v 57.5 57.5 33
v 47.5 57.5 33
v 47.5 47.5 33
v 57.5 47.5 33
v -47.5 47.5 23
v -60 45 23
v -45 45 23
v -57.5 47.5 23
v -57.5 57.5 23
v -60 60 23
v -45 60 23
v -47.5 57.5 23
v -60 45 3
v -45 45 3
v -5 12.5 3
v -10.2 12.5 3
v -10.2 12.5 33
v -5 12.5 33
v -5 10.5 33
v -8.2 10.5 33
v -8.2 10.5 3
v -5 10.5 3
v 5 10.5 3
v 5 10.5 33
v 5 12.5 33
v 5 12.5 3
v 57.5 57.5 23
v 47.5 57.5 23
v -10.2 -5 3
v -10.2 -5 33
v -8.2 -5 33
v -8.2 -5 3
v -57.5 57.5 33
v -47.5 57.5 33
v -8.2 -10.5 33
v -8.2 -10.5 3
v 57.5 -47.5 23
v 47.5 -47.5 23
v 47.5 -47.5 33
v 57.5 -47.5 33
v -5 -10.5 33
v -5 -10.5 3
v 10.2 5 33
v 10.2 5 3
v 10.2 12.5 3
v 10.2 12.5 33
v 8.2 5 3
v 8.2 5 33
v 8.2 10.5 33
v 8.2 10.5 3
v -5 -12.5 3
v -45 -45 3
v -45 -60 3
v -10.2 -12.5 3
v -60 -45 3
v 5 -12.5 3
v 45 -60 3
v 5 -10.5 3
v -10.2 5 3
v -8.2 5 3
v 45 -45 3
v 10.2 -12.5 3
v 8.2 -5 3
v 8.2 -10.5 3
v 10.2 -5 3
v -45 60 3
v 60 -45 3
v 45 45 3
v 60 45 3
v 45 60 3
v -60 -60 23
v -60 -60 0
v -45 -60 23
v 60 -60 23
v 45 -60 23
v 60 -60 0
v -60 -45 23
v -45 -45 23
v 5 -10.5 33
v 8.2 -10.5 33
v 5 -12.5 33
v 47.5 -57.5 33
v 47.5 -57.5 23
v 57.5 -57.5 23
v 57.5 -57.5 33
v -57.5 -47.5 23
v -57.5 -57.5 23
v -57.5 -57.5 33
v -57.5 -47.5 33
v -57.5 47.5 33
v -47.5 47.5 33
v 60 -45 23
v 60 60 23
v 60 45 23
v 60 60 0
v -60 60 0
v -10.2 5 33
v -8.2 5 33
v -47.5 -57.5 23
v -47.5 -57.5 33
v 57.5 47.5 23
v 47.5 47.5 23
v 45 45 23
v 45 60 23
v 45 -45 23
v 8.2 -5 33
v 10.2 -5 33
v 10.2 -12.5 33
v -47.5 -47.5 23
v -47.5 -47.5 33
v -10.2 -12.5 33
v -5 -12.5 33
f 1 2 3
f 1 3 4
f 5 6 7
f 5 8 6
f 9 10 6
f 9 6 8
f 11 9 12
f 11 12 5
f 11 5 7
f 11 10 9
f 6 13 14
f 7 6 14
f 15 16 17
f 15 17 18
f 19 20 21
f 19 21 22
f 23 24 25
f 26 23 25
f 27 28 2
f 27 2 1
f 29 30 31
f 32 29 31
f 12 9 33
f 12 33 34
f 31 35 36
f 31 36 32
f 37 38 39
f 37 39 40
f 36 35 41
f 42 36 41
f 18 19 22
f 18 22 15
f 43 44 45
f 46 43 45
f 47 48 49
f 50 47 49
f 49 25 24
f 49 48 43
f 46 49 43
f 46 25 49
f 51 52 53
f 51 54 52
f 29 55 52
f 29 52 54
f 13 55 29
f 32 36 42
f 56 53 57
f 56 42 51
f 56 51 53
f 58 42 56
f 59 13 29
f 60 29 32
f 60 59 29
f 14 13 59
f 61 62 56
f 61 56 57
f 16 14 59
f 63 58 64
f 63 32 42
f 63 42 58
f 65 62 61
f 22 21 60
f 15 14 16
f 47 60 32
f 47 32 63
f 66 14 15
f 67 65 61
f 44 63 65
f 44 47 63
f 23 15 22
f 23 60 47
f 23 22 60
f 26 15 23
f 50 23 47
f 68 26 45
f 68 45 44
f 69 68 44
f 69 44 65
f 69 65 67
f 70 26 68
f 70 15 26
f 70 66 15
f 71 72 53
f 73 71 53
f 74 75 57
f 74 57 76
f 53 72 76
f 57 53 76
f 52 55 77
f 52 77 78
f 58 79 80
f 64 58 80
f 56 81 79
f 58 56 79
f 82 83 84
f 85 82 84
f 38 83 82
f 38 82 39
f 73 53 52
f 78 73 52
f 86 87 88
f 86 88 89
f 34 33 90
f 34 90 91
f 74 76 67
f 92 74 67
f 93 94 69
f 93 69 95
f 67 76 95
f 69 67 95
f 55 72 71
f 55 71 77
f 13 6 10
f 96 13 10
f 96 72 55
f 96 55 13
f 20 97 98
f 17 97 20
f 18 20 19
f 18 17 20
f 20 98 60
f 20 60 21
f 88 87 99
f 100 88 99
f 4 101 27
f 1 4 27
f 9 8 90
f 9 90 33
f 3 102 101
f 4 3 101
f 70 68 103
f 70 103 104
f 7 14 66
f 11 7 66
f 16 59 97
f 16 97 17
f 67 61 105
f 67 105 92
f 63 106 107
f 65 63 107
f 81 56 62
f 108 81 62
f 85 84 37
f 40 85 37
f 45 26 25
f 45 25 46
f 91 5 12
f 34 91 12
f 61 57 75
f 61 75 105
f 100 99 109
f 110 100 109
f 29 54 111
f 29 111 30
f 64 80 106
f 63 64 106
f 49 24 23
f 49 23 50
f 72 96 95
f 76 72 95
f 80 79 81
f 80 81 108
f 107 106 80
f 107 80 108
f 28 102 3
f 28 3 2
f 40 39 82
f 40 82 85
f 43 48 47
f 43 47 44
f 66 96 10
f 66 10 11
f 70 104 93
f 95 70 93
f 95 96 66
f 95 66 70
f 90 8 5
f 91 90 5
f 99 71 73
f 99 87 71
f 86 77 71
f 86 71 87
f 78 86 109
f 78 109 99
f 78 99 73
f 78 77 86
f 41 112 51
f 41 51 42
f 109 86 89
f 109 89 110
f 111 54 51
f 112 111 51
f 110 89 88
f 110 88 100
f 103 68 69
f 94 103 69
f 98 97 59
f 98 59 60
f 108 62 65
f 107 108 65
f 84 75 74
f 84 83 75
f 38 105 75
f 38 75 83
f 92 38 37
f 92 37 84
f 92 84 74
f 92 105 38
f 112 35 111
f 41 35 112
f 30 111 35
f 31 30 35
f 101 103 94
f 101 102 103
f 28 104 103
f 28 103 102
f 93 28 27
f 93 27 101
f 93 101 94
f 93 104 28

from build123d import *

# Parameters (mm, degrees)
F0_W      = 120
F0_H      = 120
F1_DEPTH  = 3
F2_W      = 15
F2_H      = 15
F3_DEPTH  = 20
F4_W      = 10
F4_H      = 10
F5_DEPTH  = 10
F6_W      = 20.4
F6_H      = 25
F7_DEPTH  = 33
F8_W      = 16.4
F8_H      = 21
F9_DEPTH  = 30
F10_W     = 20.4
F10_H     = 10
F11_DEPTH = 30
F12_W     = 10
F12_H     = 25
F13_DEPTH = 30


with BuildPart() as f1:
    # F0 (on Top) → F1 (new body)
    with BuildSketch(Plane.XY):
        Rectangle(F0_W, F0_H)
    extrude(amount=F1_DEPTH)

    # F2 (on face) → F3 (join)
    with BuildSketch(Plane.XY.offset(3)):
        with Locations((-52.5, 52.5)):
            Rectangle(F2_W, F2_H)
        with Locations((-52.5, -52.5)):
            Rectangle(F2_W, F2_H)
        with Locations((52.5, -52.5)):
            Rectangle(F2_W, F2_H)
        with Locations((52.5, 52.5)):
            Rectangle(F2_W, F2_H)
    extrude(amount=F3_DEPTH)

    # F4 (on face) → F5 (join)
    with BuildSketch(Plane.XY.offset(23)):
        with Locations((-52.5, -52.5)):
            Rectangle(F4_W, F4_H)
        with Locations((52.5, -52.5)):
            Rectangle(F4_W, F4_H)
        with Locations((-52.5, 52.5)):
            Rectangle(F4_W, F4_H)
        with Locations((52.5, 52.5)):
            Rectangle(F4_W, F4_H)
    extrude(amount=F5_DEPTH)

    # F6 (on Top) → F7 (join)
    with BuildSketch(Plane.XY):
        Rectangle(F6_W, F6_H)
    extrude(amount=F7_DEPTH)

    # F8 (on face) → F9 (cut)
    with BuildSketch(Plane.XY.offset(33)):
        Rectangle(F8_W, F8_H)
    extrude(amount=-F9_DEPTH, mode=Mode.SUBTRACT)

    # F10 (on face) → F11 (cut)
    with BuildSketch(Plane.XY.offset(33)):
        Rectangle(F10_W, F10_H)
    extrude(amount=-F11_DEPTH, mode=Mode.SUBTRACT)

    # F12 (on face) → F13 (cut)
    with BuildSketch(Plane.XY.offset(33)):
        Rectangle(F12_W, F12_H)
    extrude(amount=-F13_DEPTH, mode=Mode.SUBTRACT)


solid = f1.part
